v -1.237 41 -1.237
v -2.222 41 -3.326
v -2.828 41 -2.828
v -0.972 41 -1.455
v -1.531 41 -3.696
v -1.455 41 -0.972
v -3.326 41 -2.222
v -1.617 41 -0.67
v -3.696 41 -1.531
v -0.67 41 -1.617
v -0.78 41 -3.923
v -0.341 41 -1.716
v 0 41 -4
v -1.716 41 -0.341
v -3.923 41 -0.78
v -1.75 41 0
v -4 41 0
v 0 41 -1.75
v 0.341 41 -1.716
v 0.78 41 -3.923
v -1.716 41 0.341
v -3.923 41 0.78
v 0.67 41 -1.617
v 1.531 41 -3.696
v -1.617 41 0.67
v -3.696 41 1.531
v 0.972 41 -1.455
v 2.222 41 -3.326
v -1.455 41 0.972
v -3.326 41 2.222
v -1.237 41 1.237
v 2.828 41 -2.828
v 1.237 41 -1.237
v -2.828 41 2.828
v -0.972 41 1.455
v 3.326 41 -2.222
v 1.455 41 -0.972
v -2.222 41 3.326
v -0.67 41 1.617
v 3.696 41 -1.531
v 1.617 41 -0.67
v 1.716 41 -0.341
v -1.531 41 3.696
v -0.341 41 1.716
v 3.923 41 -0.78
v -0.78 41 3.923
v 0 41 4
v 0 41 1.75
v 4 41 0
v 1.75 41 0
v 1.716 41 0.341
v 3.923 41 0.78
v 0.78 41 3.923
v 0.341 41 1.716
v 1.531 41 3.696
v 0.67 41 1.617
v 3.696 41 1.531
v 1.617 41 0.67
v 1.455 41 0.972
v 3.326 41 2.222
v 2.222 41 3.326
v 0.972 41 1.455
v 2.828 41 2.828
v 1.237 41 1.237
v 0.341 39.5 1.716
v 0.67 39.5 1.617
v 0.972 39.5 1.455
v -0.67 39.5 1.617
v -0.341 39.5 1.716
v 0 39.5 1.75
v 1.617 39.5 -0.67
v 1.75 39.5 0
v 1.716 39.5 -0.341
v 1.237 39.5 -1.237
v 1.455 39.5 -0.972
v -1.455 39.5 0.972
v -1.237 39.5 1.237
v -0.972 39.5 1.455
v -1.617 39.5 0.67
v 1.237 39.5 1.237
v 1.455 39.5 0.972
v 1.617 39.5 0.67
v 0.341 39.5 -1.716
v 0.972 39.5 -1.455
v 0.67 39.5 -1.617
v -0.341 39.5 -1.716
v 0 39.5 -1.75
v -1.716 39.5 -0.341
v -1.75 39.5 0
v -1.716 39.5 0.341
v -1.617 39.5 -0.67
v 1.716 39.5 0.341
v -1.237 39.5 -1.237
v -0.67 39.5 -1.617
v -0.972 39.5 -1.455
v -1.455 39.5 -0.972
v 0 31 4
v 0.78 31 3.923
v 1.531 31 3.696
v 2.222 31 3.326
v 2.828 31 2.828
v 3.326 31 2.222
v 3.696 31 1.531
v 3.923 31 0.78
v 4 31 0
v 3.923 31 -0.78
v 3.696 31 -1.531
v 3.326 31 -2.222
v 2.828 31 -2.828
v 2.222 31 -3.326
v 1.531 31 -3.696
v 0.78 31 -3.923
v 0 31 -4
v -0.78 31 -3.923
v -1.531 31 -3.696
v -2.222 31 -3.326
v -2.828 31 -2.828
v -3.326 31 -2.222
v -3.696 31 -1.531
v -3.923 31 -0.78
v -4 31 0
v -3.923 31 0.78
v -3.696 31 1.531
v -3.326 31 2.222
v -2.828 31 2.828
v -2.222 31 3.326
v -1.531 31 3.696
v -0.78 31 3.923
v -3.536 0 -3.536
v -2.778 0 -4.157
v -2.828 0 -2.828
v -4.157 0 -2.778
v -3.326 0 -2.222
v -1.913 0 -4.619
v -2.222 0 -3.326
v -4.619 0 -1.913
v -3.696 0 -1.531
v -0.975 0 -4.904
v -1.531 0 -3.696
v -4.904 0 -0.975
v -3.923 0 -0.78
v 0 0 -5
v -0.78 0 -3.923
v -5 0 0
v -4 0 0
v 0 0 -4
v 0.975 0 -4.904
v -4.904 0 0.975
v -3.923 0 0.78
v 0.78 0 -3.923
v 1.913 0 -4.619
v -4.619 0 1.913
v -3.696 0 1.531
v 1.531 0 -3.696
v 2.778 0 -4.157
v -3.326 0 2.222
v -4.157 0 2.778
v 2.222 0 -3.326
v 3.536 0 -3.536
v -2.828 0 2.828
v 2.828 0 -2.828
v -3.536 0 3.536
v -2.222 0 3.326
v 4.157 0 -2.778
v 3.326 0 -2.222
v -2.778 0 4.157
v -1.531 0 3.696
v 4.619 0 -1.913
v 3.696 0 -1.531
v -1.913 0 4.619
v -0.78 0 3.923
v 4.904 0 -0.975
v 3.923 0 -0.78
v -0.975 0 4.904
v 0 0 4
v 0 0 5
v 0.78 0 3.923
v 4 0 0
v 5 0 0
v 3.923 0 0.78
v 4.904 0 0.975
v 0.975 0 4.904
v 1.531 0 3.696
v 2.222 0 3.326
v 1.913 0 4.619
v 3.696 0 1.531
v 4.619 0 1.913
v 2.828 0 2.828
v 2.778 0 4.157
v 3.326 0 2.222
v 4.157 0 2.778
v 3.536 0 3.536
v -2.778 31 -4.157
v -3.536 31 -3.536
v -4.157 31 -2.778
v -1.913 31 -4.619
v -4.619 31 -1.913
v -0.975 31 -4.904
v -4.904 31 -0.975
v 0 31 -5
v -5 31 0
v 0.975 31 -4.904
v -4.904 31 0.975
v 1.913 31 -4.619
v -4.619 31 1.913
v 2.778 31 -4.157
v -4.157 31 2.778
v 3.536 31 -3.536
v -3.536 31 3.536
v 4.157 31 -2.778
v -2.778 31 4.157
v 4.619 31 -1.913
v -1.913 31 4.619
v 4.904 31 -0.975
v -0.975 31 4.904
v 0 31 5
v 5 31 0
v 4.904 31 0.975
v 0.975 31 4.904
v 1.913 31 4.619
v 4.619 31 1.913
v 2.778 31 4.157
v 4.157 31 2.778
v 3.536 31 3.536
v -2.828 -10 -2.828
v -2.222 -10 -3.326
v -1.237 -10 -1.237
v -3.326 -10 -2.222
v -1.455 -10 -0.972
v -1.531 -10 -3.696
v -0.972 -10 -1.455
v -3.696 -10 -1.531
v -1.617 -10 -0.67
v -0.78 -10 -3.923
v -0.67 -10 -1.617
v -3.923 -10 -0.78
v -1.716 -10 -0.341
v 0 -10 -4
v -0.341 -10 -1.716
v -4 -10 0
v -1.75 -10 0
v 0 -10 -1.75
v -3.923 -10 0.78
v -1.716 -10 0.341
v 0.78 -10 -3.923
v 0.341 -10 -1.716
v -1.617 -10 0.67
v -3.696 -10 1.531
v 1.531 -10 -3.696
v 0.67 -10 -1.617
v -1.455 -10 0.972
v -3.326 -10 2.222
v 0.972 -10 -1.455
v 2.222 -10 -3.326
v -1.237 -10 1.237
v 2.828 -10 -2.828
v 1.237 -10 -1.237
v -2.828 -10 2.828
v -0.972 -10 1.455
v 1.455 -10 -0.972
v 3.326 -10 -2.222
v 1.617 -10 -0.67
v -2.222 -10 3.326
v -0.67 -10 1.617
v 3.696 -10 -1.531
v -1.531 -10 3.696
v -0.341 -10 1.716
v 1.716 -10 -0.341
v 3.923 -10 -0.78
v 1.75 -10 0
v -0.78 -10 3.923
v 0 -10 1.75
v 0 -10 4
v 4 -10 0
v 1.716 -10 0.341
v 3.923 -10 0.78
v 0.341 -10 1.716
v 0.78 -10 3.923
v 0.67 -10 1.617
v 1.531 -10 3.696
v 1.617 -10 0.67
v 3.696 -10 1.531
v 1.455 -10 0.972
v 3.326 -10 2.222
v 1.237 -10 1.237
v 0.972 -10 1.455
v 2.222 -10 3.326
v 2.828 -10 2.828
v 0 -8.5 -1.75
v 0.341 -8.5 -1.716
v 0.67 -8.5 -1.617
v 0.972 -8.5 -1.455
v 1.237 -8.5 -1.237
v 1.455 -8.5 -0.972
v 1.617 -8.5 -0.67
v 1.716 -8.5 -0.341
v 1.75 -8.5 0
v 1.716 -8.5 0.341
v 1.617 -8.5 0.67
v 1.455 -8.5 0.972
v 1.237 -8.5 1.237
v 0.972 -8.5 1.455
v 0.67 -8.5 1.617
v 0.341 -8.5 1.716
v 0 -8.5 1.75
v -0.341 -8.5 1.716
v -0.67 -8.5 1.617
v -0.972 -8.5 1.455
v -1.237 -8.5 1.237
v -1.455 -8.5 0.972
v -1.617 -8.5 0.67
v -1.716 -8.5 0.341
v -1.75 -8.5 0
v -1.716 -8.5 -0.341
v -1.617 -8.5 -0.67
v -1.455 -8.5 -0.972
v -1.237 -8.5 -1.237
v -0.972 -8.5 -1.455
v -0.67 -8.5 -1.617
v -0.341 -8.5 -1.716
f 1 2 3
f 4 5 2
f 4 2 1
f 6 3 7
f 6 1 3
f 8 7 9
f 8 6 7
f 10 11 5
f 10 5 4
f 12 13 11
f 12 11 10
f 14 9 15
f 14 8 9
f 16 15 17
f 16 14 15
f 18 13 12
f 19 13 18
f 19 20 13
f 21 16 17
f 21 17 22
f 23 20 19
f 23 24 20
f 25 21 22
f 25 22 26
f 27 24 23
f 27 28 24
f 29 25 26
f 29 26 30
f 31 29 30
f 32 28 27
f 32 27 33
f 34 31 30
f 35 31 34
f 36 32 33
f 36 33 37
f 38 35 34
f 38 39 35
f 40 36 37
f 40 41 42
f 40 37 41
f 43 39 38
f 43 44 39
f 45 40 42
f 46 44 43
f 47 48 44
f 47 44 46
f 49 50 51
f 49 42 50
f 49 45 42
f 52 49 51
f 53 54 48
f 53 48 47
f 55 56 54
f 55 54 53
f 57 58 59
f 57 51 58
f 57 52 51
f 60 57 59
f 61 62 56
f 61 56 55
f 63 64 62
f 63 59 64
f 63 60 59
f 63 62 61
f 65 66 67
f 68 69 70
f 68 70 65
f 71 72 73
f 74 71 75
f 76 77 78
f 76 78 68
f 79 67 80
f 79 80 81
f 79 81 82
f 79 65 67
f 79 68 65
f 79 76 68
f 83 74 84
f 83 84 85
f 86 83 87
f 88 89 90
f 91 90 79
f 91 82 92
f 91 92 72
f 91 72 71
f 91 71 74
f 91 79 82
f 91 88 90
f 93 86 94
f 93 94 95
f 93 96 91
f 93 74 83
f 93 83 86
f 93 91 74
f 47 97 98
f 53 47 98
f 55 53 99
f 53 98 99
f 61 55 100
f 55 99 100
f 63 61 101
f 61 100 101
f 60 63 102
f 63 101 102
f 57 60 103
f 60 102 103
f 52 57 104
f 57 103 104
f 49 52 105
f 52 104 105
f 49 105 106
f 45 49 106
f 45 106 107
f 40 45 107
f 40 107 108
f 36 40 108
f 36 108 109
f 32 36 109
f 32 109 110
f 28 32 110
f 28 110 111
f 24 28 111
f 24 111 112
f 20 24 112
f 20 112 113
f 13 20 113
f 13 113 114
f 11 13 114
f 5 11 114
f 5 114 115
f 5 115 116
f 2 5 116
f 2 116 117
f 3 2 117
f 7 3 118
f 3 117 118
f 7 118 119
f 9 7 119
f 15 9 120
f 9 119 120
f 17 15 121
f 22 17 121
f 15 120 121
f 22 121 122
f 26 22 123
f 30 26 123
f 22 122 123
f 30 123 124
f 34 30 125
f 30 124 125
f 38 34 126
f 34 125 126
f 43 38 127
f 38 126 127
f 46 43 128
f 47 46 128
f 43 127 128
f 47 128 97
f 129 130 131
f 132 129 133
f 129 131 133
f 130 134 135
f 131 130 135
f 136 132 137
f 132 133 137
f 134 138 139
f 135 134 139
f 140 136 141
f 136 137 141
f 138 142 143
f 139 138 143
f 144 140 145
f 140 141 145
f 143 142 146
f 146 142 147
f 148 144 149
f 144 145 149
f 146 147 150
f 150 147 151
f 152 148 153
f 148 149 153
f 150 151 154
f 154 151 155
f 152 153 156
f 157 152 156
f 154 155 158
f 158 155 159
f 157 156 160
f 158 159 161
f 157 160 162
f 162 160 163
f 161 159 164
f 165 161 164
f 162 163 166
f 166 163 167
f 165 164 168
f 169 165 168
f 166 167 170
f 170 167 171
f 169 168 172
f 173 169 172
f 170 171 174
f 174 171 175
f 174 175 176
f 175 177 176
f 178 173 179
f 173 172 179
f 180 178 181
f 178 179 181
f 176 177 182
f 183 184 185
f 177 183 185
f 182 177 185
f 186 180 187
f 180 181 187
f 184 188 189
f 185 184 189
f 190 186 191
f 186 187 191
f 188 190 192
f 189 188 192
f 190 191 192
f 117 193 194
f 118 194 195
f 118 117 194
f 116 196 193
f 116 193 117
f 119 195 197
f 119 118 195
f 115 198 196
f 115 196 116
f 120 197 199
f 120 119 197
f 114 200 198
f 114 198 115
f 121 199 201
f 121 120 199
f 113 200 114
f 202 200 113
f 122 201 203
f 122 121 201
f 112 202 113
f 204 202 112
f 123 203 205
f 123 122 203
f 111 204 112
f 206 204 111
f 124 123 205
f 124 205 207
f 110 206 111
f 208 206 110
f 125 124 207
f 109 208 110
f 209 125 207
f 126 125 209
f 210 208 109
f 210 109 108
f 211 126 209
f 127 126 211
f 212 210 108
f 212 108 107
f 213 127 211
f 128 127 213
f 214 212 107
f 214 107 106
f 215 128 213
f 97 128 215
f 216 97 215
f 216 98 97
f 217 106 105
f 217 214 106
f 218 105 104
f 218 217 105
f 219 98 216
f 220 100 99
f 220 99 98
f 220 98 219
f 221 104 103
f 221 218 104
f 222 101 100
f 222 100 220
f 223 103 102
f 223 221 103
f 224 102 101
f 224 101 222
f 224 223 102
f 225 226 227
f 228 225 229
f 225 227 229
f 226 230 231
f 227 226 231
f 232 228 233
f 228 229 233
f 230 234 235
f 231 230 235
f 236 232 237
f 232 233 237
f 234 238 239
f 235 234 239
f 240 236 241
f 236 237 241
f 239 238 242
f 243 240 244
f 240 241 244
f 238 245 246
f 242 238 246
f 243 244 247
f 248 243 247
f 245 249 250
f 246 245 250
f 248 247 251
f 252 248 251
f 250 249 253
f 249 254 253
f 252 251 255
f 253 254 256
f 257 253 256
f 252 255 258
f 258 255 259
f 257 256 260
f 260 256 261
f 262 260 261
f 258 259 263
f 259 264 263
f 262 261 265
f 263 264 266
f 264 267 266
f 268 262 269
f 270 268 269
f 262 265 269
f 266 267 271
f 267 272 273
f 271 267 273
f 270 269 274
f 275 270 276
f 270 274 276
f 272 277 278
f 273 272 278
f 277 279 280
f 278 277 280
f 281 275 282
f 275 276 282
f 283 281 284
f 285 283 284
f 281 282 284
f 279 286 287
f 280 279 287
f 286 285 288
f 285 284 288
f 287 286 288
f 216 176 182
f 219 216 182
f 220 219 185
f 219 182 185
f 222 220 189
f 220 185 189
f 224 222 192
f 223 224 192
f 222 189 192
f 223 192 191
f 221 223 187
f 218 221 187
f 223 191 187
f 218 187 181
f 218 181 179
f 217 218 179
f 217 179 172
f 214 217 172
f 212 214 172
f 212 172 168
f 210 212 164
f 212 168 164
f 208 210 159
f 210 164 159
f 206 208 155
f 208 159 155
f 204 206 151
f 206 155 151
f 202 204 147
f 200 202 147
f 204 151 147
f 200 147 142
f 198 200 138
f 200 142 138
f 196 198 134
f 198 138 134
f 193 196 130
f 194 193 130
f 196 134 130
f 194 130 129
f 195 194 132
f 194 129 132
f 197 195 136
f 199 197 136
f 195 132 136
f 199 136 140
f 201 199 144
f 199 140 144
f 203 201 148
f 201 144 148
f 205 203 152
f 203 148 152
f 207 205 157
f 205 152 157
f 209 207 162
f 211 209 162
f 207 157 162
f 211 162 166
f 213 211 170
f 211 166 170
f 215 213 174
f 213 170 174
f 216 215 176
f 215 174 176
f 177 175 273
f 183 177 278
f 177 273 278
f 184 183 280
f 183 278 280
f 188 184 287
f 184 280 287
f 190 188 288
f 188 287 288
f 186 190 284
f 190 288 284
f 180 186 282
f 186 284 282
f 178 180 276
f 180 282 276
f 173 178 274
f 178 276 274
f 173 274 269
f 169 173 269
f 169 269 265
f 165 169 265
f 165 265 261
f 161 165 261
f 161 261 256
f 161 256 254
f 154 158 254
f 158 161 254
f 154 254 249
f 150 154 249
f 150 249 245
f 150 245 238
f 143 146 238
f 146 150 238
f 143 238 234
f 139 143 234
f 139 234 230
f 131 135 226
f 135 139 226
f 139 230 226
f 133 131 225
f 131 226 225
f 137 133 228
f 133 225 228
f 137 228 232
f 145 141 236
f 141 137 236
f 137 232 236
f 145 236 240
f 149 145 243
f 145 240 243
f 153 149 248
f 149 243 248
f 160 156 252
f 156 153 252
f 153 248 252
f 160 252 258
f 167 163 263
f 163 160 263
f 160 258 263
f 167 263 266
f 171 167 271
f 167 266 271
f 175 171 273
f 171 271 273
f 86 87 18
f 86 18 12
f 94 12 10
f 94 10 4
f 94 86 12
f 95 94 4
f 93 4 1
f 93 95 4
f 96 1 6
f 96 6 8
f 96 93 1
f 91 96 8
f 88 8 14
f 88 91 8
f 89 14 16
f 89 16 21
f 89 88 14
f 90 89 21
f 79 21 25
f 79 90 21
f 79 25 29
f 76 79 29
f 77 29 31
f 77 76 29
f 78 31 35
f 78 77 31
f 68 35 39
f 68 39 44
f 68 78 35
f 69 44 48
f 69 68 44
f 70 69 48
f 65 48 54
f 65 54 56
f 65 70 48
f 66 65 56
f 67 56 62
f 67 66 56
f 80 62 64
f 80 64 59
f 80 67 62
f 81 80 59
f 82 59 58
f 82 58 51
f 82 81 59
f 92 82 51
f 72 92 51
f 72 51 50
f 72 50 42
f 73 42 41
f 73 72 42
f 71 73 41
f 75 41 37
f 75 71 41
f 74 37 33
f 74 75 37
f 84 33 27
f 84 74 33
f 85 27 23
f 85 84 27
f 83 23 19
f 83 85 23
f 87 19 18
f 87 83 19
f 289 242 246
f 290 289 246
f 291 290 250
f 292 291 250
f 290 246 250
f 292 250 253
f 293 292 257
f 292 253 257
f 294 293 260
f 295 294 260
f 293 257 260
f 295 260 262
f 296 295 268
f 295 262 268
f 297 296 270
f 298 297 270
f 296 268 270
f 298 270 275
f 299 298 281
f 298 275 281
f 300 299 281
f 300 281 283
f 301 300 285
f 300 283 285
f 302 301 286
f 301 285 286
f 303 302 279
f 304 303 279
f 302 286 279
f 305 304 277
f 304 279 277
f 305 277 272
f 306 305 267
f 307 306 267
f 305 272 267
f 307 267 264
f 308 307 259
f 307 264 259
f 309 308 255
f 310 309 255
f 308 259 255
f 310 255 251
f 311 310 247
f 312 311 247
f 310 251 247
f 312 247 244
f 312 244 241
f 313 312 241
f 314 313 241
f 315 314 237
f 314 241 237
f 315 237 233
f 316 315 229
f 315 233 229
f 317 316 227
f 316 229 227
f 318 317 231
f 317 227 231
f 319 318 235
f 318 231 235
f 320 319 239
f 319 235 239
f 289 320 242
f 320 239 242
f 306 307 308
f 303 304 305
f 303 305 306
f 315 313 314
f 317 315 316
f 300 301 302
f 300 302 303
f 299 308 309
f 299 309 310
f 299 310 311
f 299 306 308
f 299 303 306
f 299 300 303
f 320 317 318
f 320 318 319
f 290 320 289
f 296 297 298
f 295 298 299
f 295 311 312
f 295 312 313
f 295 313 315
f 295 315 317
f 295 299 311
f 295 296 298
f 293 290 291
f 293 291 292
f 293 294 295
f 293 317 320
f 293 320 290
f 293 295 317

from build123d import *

# Parameters (mm, degrees)
SKETCH1_R                = 5
BOSS_EXTRUDE1_DEPTH      = 31
BOSS_EXTRUDE2_DEPTH      = 10
BOSS_EXTRUDE2_DEPTH_BACK = 41
SKETCH2_R                = 4
SKETCH3_R                = 1.75
CUT_EXTRUDE1_DEPTH       = 1.5
CUT_EXTRUDE2_START       = -1.5
SKETCH4_R                = 1.75
CUT_EXTRUDE2_DEPTH       = 1.5


with BuildPart() as part:
    # Sketch1 → Boss-Extrude1 (new body)
    with BuildSketch(Plane(origin=(0, 0, 0), x_dir=(1, 0, 0), z_dir=(0, 1, 0))):
        with Locations(Location((0, 0, 0), (0, 0, 270))):
            Circle(SKETCH1_R)
    extrude(amount=BOSS_EXTRUDE1_DEPTH)

    # Sketch2 → Boss-Extrude2 (add, two sides: drawn at the far end of the back side and taken through both)
    with BuildSketch(Plane(origin=(0, 31, 0), x_dir=(1, 0, 0), z_dir=(0, 1, 0)).offset(-BOSS_EXTRUDE2_DEPTH_BACK)):
        with Locations(Location((0, 0, 0), (0, 0, 270))):
            Circle(SKETCH2_R)
    extrude(amount=BOSS_EXTRUDE2_DEPTH + BOSS_EXTRUDE2_DEPTH_BACK)

    # Sketch3 → Cut-Extrude1 (cut)
    with BuildSketch(Plane.XZ.offset(10)):
        with Locations(Location((0, 0, 0), (0, 0, 270))):
            Circle(SKETCH3_R)
    extrude(amount=-CUT_EXTRUDE1_DEPTH, mode=Mode.SUBTRACT)

    # Sketch4 → Cut-Extrude2 (cut)
    with BuildSketch(Plane(origin=(0, 41, 0), x_dir=(1, 0, 0), z_dir=(0, 1, 0)).offset(CUT_EXTRUDE2_START)):
        with Locations(Location((0, 0, 0), (0, 0, 90))):
            Circle(SKETCH4_R)
    extrude(amount=CUT_EXTRUDE2_DEPTH, mode=Mode.SUBTRACT)


solid = part.part
